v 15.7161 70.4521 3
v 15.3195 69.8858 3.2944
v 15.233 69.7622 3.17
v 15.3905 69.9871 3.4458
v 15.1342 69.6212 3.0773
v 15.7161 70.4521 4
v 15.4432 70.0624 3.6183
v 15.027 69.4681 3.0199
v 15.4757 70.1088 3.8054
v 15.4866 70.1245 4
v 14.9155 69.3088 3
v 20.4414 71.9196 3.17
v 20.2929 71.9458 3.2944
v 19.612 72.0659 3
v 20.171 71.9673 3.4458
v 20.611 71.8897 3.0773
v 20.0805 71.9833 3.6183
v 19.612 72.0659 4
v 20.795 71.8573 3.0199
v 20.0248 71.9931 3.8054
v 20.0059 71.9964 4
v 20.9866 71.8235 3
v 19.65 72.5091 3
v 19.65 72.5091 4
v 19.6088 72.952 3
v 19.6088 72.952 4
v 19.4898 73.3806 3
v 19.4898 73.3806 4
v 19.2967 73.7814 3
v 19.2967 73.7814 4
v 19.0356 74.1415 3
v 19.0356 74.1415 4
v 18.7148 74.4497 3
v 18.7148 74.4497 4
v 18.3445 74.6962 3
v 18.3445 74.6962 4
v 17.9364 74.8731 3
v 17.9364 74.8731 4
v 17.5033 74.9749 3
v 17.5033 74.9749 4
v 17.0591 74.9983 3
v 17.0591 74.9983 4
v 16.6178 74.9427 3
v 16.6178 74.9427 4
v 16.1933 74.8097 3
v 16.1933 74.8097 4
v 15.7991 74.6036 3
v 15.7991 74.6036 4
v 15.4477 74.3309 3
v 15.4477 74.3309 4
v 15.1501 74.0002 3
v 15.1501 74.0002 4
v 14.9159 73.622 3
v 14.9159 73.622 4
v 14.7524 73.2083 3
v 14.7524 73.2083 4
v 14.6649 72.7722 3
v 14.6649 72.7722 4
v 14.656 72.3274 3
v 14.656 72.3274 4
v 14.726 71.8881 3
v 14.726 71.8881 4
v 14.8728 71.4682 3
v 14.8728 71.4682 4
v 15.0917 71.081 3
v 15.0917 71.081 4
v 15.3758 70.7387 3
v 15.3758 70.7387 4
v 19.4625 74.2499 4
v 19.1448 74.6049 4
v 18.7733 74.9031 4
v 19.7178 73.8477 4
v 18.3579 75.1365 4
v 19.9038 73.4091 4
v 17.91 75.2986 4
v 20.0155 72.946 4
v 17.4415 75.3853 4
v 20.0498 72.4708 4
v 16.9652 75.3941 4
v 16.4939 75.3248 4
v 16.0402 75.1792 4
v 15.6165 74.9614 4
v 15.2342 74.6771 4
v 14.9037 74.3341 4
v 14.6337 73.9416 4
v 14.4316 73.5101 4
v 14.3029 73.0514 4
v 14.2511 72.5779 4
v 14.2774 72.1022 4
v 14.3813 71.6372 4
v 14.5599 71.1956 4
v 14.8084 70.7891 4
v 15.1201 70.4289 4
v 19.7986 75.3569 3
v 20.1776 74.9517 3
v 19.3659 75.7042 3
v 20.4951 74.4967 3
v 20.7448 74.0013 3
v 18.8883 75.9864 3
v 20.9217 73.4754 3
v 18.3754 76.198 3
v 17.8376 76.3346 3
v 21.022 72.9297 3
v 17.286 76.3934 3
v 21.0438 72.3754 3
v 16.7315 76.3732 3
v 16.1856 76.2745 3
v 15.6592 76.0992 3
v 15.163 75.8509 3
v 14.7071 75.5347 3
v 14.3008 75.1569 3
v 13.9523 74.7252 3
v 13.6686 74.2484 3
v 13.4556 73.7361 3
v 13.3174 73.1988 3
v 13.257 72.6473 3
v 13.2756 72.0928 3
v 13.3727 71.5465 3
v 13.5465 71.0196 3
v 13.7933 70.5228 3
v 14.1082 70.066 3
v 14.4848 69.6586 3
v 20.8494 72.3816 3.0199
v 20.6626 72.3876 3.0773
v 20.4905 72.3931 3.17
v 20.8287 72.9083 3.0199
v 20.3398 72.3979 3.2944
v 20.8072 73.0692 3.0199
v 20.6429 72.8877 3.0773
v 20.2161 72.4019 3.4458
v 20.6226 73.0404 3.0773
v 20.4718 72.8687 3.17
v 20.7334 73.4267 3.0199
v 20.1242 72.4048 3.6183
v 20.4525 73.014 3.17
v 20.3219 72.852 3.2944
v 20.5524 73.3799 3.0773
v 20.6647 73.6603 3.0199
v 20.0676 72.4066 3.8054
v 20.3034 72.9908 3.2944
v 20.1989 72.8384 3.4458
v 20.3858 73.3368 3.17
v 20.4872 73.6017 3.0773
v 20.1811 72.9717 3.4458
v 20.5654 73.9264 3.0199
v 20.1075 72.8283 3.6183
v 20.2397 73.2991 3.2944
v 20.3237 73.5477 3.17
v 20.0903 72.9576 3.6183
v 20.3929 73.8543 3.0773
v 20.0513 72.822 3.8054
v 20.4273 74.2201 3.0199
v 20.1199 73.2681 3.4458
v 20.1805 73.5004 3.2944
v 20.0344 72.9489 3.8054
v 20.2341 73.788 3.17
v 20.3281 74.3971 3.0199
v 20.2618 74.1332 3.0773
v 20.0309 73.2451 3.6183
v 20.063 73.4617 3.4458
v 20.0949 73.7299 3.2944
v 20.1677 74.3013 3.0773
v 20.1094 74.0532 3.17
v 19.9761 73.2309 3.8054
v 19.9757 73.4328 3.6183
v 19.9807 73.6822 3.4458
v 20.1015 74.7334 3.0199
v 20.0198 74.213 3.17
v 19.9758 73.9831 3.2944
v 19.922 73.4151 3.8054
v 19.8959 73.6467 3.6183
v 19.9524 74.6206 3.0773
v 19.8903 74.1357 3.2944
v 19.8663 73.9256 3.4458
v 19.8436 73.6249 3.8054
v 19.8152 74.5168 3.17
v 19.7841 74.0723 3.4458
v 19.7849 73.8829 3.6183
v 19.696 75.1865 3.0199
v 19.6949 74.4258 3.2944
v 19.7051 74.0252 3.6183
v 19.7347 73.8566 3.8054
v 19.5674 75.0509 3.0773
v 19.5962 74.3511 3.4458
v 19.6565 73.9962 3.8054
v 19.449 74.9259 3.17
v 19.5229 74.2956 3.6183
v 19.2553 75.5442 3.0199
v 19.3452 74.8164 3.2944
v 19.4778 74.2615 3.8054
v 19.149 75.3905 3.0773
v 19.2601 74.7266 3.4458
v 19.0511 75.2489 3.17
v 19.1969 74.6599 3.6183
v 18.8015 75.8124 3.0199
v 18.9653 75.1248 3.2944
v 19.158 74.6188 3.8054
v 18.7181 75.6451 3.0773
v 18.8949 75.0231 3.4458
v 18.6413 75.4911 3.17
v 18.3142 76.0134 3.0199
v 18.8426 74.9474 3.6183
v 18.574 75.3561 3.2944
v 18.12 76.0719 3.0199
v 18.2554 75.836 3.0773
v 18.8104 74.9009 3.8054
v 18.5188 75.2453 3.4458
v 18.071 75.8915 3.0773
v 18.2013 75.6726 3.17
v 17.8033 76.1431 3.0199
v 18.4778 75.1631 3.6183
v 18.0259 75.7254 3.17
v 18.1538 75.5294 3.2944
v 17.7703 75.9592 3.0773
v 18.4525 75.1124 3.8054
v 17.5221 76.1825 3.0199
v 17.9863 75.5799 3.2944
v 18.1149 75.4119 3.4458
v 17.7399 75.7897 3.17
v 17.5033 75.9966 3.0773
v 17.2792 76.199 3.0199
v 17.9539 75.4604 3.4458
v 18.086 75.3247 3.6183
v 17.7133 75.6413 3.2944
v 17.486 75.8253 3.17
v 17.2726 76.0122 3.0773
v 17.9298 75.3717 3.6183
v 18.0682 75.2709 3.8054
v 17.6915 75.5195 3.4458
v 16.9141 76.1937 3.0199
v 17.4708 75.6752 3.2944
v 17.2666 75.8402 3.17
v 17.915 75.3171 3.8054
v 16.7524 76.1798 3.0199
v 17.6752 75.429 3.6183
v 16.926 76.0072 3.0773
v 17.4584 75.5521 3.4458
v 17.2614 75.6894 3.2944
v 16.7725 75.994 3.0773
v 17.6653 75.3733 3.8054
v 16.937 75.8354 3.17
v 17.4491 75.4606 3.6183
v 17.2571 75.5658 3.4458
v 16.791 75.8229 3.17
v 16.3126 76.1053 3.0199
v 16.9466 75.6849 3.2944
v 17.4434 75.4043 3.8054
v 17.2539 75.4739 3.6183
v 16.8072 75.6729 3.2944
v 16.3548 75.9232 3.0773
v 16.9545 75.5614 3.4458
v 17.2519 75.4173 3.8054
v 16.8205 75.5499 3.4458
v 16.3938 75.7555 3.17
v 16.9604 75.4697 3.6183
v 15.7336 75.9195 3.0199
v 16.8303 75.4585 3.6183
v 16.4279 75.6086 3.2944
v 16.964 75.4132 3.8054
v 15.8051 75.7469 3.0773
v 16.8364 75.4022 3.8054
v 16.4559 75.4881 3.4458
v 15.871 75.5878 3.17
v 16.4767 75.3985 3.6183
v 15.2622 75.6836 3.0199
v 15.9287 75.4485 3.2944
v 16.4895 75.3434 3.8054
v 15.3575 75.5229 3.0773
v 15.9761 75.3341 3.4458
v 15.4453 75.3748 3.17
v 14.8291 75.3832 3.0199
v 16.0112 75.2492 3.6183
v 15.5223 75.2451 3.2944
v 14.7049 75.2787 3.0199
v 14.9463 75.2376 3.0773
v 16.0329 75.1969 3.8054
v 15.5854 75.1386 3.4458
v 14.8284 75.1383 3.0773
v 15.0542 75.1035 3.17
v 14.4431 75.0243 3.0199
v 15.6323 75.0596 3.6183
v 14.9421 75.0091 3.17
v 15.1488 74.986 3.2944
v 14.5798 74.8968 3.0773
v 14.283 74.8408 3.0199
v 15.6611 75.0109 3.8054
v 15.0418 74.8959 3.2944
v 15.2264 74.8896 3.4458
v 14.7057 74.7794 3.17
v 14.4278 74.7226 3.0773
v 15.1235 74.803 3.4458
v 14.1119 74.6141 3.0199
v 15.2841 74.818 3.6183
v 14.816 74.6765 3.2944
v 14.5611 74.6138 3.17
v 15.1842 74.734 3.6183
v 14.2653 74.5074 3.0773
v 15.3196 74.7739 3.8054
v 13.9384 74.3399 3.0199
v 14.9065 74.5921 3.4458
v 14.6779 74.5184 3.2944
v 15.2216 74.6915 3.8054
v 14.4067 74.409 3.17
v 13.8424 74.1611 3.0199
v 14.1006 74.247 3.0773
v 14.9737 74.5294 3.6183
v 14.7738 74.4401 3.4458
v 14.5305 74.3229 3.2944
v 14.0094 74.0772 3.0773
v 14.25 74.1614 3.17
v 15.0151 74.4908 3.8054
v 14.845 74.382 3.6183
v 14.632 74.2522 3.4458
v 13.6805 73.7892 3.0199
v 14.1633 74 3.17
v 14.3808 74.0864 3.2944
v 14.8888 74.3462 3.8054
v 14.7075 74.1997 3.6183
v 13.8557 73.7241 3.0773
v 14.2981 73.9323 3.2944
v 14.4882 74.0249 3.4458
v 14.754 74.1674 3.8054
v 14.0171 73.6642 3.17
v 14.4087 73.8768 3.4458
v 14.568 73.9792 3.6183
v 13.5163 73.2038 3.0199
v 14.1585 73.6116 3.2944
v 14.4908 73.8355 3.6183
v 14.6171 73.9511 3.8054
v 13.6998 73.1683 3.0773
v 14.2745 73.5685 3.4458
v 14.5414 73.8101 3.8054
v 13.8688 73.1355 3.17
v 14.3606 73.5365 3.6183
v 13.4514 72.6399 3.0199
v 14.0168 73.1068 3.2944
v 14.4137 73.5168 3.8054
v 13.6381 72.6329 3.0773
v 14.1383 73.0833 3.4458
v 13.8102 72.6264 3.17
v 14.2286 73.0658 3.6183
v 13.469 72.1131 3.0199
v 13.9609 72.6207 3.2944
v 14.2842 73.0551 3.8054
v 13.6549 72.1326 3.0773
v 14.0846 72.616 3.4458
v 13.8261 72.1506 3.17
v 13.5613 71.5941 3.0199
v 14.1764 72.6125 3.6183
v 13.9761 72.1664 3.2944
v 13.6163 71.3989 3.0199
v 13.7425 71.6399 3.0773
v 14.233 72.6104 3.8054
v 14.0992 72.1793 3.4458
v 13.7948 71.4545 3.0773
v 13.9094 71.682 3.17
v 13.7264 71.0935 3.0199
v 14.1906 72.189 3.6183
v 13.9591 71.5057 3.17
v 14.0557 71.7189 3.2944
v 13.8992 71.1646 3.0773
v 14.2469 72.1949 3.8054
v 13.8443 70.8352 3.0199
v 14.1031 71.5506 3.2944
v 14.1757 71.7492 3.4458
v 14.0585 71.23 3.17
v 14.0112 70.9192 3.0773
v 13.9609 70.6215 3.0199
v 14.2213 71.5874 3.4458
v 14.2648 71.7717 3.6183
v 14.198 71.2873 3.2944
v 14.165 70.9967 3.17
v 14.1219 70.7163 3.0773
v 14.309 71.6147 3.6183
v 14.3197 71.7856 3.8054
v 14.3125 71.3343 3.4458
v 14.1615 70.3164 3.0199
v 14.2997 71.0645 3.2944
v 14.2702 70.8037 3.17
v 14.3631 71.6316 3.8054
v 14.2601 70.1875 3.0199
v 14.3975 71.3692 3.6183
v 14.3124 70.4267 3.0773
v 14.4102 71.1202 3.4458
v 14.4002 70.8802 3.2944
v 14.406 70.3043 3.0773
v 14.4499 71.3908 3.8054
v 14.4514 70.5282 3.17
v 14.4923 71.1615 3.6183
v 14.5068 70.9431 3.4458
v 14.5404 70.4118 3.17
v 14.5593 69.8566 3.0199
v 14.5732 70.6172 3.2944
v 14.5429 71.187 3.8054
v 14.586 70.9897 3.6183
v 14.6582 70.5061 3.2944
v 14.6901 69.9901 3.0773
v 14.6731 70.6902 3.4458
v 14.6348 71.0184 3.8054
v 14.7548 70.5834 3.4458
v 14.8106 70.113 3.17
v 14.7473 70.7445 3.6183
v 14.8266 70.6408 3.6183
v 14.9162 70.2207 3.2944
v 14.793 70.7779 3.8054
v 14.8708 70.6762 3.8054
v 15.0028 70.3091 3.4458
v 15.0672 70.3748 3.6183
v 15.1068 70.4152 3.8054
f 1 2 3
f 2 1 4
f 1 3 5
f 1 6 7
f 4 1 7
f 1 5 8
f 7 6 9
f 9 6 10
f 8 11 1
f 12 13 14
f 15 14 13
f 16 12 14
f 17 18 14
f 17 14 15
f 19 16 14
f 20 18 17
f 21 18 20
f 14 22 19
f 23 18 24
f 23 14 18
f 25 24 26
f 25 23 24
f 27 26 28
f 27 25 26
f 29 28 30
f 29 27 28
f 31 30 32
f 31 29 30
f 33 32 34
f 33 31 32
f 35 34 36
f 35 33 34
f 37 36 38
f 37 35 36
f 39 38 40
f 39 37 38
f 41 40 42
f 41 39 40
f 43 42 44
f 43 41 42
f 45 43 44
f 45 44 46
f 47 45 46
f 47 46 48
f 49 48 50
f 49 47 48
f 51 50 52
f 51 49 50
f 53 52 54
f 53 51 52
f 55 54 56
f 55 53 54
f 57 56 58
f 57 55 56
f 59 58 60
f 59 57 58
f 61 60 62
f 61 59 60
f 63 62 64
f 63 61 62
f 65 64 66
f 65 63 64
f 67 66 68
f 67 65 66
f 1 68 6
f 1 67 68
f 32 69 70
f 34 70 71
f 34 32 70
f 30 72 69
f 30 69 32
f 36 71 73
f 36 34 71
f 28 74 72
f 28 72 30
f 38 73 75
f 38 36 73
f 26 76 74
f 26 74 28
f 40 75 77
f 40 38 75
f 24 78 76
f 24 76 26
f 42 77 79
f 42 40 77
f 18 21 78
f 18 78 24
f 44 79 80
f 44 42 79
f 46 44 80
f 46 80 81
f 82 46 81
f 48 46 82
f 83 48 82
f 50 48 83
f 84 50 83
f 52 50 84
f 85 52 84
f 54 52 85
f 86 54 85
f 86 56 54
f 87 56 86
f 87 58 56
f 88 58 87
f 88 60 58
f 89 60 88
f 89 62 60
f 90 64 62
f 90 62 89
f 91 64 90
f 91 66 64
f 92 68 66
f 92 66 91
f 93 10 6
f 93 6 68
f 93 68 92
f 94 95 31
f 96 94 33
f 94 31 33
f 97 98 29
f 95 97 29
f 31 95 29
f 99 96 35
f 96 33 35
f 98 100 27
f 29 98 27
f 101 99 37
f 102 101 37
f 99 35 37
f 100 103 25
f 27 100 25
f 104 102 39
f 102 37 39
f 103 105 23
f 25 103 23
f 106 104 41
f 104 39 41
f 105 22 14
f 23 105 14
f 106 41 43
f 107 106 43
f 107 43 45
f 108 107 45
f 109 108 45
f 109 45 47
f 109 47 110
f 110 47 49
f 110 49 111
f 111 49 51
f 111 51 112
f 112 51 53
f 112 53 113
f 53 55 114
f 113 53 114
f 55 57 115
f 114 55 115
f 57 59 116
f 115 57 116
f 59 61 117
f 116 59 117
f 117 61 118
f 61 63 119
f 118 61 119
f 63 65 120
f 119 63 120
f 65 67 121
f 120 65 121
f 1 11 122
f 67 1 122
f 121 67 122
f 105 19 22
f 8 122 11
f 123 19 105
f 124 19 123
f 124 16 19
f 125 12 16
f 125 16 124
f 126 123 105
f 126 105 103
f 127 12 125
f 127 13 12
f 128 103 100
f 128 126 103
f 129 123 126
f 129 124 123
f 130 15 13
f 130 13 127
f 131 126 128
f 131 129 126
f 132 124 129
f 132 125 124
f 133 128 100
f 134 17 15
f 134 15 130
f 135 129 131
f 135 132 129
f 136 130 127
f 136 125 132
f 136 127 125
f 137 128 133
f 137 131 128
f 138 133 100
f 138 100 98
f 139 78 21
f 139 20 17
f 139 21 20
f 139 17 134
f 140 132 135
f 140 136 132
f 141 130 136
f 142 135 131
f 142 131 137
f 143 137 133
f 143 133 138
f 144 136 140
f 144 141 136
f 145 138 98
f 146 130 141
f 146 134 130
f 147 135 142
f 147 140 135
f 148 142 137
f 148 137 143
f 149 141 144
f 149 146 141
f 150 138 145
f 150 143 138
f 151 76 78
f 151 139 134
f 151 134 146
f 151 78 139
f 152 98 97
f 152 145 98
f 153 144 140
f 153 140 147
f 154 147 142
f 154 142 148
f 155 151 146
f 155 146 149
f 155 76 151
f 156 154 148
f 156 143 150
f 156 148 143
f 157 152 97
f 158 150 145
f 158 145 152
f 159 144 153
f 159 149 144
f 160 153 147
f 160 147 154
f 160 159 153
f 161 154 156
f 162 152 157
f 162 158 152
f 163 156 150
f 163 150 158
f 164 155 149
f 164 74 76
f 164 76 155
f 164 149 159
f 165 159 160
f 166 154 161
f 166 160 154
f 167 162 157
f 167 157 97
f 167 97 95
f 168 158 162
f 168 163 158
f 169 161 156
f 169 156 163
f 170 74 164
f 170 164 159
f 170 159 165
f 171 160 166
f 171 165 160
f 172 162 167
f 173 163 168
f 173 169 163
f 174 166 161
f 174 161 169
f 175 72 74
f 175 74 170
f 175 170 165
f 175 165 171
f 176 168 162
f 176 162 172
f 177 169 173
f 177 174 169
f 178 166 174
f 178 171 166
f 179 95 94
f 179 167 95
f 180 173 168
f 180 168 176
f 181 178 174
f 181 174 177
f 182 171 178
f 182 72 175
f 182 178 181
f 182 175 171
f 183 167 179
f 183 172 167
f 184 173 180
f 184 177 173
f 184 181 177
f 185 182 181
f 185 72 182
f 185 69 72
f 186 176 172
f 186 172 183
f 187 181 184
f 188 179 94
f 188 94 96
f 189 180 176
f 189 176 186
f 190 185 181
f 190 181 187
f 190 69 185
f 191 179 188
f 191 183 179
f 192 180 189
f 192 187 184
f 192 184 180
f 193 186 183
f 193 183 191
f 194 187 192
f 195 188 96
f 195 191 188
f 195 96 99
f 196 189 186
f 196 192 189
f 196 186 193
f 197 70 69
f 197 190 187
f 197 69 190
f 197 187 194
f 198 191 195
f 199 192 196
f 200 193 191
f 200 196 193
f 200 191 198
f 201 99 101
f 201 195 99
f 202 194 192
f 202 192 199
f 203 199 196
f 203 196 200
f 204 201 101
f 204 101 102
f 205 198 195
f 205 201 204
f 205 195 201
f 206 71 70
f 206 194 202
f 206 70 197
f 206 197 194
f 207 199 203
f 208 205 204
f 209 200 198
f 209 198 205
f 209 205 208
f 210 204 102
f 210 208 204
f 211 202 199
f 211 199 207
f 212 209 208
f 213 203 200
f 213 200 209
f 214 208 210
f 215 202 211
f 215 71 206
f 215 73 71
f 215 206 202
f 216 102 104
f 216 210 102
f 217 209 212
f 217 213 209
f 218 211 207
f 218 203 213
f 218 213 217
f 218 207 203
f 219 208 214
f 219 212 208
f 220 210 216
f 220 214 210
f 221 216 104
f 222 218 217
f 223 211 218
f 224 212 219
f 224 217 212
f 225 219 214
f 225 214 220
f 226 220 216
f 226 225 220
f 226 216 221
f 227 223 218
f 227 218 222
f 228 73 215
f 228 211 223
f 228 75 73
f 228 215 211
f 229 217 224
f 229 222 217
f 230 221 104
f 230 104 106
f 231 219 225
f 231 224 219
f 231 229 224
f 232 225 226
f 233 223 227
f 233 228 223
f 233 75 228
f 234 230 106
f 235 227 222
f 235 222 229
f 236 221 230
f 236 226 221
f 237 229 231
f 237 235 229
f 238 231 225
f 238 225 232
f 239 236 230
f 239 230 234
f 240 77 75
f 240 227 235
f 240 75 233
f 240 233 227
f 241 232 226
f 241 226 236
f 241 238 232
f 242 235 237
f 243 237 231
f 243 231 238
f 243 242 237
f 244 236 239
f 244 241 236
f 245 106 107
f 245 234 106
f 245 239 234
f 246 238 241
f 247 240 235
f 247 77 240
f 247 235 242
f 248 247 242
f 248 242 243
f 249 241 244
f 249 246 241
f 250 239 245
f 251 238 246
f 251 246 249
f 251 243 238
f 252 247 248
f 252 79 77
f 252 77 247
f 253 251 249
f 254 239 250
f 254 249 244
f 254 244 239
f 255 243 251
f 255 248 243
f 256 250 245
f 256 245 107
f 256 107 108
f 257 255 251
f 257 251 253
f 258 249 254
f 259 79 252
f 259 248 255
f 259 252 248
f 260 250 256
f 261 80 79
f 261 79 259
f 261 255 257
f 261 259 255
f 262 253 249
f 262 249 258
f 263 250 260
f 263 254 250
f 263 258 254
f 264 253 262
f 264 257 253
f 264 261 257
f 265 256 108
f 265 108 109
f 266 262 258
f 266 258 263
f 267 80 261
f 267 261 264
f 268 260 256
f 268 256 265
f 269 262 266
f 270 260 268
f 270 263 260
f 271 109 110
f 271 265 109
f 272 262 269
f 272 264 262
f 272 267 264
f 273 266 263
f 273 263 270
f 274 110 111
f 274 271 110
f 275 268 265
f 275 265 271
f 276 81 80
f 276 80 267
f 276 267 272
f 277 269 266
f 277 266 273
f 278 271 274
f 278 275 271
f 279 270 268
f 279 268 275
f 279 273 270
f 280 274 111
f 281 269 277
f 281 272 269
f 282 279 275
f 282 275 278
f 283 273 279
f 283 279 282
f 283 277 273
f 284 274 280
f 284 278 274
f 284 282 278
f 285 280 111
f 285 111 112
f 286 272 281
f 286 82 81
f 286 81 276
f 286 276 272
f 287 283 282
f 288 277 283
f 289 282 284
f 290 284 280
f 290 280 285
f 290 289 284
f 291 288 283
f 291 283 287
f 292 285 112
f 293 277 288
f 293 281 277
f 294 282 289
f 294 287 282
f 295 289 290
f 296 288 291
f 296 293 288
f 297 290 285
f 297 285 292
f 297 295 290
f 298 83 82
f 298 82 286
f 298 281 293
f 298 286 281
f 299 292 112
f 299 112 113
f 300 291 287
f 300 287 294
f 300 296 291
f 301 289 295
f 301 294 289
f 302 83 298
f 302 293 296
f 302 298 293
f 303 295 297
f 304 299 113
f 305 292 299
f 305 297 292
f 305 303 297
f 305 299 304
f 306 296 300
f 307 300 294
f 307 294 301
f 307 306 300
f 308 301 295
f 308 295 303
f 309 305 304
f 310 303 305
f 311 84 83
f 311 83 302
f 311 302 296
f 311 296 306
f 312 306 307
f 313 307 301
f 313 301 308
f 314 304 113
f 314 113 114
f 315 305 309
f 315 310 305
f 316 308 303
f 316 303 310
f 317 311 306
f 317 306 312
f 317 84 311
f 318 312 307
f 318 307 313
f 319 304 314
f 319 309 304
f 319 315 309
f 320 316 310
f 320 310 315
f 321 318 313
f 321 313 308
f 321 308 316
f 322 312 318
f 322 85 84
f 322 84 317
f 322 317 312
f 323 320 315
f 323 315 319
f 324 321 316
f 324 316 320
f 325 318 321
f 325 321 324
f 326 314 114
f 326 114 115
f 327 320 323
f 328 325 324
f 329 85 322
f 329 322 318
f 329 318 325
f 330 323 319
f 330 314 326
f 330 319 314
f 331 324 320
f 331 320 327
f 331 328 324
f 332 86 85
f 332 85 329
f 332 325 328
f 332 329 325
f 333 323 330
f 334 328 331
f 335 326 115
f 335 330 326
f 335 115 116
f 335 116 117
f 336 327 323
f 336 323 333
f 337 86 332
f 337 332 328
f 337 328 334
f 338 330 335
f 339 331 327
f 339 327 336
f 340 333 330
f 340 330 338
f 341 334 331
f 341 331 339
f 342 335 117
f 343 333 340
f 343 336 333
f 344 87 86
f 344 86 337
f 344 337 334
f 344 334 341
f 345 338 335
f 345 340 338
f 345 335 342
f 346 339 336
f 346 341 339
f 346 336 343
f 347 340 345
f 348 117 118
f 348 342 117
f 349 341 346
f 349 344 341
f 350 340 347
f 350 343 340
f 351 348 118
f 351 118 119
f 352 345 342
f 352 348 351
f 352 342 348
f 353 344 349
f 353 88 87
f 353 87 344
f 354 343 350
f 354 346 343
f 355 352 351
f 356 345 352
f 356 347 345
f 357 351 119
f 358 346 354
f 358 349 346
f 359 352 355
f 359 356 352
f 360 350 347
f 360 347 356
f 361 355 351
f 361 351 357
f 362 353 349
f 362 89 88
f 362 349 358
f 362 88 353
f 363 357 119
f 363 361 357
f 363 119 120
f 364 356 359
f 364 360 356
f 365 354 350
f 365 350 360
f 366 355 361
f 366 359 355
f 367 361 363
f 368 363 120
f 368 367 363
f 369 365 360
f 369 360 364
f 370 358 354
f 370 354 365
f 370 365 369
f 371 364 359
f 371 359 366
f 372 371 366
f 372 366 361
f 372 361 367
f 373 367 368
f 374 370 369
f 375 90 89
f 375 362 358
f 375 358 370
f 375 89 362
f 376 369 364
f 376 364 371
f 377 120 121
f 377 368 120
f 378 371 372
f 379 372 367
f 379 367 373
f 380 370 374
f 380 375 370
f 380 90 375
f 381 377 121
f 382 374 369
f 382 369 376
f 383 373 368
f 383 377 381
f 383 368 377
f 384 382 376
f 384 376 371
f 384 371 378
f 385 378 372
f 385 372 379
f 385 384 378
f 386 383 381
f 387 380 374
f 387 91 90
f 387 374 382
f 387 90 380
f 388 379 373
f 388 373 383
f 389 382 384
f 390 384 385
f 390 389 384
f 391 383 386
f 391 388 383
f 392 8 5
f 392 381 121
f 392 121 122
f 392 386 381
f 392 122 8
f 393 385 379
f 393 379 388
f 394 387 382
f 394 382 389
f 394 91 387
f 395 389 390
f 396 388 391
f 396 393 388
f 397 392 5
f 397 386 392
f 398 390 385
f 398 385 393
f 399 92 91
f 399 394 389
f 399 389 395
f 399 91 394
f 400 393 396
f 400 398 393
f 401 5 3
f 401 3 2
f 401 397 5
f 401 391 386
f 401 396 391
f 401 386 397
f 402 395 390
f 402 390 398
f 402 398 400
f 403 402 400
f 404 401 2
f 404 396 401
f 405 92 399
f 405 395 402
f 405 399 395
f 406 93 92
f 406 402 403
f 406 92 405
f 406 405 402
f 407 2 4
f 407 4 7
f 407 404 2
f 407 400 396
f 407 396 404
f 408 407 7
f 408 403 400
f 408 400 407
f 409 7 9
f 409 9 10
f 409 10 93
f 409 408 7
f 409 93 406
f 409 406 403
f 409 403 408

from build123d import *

# Parameters (mm, degrees)
REVOLUTION001_ANGLE = 55
REVOLUTION_ANGLE    = -190


with BuildPart() as right_pillar_round_down:
    # Sketch093 → Revolution001 (revolve)
    with BuildSketch(Plane(origin=(17.15, 72.5, 3), x_dir=(1, 0, 0), z_dir=(0, -1, 0))):
        with BuildLine():
            ThreePointArc((-3.895747, 0), (-3.191385, 0.294392), (-2.899991, 1))
            Line((-2.899991, 1), (-2.5, 1))
            Line((-2.5, 1), (-2.5, 0))
            Line((-3.895747, 0), (-2.5, 0))
        make_face()
    revolve(axis=Axis((17.15, 72.5, 3), (0, 0, 1)), revolution_arc=REVOLUTION001_ANGLE)


with BuildPart() as pillar_right_custom_round_base:
    # Sketch092 → Revolution (revolve)
    with BuildSketch(Plane(origin=(17.15, 72.5, 3), x_dir=(1, 0, 0), z_dir=(0, -1, 0))):
        with BuildLine():
            ThreePointArc((-3.895747, 0), (-3.191385, 0.294392), (-2.899991, 1))
            Line((-2.899991, 1), (-2.5, 1))
            Line((-2.5, 1), (-2.5, 0))
            Line((-3.895747, 0), (-2.5, 0))
        make_face()
    revolve(axis=Axis((17.15, 72.5, 3), (0, 0, 1)), revolution_arc=REVOLUTION_ANGLE)

    # Fusion007039: union right_pillar_round_down
    add(right_pillar_round_down.part)


solid = pillar_right_custom_round_base.part
